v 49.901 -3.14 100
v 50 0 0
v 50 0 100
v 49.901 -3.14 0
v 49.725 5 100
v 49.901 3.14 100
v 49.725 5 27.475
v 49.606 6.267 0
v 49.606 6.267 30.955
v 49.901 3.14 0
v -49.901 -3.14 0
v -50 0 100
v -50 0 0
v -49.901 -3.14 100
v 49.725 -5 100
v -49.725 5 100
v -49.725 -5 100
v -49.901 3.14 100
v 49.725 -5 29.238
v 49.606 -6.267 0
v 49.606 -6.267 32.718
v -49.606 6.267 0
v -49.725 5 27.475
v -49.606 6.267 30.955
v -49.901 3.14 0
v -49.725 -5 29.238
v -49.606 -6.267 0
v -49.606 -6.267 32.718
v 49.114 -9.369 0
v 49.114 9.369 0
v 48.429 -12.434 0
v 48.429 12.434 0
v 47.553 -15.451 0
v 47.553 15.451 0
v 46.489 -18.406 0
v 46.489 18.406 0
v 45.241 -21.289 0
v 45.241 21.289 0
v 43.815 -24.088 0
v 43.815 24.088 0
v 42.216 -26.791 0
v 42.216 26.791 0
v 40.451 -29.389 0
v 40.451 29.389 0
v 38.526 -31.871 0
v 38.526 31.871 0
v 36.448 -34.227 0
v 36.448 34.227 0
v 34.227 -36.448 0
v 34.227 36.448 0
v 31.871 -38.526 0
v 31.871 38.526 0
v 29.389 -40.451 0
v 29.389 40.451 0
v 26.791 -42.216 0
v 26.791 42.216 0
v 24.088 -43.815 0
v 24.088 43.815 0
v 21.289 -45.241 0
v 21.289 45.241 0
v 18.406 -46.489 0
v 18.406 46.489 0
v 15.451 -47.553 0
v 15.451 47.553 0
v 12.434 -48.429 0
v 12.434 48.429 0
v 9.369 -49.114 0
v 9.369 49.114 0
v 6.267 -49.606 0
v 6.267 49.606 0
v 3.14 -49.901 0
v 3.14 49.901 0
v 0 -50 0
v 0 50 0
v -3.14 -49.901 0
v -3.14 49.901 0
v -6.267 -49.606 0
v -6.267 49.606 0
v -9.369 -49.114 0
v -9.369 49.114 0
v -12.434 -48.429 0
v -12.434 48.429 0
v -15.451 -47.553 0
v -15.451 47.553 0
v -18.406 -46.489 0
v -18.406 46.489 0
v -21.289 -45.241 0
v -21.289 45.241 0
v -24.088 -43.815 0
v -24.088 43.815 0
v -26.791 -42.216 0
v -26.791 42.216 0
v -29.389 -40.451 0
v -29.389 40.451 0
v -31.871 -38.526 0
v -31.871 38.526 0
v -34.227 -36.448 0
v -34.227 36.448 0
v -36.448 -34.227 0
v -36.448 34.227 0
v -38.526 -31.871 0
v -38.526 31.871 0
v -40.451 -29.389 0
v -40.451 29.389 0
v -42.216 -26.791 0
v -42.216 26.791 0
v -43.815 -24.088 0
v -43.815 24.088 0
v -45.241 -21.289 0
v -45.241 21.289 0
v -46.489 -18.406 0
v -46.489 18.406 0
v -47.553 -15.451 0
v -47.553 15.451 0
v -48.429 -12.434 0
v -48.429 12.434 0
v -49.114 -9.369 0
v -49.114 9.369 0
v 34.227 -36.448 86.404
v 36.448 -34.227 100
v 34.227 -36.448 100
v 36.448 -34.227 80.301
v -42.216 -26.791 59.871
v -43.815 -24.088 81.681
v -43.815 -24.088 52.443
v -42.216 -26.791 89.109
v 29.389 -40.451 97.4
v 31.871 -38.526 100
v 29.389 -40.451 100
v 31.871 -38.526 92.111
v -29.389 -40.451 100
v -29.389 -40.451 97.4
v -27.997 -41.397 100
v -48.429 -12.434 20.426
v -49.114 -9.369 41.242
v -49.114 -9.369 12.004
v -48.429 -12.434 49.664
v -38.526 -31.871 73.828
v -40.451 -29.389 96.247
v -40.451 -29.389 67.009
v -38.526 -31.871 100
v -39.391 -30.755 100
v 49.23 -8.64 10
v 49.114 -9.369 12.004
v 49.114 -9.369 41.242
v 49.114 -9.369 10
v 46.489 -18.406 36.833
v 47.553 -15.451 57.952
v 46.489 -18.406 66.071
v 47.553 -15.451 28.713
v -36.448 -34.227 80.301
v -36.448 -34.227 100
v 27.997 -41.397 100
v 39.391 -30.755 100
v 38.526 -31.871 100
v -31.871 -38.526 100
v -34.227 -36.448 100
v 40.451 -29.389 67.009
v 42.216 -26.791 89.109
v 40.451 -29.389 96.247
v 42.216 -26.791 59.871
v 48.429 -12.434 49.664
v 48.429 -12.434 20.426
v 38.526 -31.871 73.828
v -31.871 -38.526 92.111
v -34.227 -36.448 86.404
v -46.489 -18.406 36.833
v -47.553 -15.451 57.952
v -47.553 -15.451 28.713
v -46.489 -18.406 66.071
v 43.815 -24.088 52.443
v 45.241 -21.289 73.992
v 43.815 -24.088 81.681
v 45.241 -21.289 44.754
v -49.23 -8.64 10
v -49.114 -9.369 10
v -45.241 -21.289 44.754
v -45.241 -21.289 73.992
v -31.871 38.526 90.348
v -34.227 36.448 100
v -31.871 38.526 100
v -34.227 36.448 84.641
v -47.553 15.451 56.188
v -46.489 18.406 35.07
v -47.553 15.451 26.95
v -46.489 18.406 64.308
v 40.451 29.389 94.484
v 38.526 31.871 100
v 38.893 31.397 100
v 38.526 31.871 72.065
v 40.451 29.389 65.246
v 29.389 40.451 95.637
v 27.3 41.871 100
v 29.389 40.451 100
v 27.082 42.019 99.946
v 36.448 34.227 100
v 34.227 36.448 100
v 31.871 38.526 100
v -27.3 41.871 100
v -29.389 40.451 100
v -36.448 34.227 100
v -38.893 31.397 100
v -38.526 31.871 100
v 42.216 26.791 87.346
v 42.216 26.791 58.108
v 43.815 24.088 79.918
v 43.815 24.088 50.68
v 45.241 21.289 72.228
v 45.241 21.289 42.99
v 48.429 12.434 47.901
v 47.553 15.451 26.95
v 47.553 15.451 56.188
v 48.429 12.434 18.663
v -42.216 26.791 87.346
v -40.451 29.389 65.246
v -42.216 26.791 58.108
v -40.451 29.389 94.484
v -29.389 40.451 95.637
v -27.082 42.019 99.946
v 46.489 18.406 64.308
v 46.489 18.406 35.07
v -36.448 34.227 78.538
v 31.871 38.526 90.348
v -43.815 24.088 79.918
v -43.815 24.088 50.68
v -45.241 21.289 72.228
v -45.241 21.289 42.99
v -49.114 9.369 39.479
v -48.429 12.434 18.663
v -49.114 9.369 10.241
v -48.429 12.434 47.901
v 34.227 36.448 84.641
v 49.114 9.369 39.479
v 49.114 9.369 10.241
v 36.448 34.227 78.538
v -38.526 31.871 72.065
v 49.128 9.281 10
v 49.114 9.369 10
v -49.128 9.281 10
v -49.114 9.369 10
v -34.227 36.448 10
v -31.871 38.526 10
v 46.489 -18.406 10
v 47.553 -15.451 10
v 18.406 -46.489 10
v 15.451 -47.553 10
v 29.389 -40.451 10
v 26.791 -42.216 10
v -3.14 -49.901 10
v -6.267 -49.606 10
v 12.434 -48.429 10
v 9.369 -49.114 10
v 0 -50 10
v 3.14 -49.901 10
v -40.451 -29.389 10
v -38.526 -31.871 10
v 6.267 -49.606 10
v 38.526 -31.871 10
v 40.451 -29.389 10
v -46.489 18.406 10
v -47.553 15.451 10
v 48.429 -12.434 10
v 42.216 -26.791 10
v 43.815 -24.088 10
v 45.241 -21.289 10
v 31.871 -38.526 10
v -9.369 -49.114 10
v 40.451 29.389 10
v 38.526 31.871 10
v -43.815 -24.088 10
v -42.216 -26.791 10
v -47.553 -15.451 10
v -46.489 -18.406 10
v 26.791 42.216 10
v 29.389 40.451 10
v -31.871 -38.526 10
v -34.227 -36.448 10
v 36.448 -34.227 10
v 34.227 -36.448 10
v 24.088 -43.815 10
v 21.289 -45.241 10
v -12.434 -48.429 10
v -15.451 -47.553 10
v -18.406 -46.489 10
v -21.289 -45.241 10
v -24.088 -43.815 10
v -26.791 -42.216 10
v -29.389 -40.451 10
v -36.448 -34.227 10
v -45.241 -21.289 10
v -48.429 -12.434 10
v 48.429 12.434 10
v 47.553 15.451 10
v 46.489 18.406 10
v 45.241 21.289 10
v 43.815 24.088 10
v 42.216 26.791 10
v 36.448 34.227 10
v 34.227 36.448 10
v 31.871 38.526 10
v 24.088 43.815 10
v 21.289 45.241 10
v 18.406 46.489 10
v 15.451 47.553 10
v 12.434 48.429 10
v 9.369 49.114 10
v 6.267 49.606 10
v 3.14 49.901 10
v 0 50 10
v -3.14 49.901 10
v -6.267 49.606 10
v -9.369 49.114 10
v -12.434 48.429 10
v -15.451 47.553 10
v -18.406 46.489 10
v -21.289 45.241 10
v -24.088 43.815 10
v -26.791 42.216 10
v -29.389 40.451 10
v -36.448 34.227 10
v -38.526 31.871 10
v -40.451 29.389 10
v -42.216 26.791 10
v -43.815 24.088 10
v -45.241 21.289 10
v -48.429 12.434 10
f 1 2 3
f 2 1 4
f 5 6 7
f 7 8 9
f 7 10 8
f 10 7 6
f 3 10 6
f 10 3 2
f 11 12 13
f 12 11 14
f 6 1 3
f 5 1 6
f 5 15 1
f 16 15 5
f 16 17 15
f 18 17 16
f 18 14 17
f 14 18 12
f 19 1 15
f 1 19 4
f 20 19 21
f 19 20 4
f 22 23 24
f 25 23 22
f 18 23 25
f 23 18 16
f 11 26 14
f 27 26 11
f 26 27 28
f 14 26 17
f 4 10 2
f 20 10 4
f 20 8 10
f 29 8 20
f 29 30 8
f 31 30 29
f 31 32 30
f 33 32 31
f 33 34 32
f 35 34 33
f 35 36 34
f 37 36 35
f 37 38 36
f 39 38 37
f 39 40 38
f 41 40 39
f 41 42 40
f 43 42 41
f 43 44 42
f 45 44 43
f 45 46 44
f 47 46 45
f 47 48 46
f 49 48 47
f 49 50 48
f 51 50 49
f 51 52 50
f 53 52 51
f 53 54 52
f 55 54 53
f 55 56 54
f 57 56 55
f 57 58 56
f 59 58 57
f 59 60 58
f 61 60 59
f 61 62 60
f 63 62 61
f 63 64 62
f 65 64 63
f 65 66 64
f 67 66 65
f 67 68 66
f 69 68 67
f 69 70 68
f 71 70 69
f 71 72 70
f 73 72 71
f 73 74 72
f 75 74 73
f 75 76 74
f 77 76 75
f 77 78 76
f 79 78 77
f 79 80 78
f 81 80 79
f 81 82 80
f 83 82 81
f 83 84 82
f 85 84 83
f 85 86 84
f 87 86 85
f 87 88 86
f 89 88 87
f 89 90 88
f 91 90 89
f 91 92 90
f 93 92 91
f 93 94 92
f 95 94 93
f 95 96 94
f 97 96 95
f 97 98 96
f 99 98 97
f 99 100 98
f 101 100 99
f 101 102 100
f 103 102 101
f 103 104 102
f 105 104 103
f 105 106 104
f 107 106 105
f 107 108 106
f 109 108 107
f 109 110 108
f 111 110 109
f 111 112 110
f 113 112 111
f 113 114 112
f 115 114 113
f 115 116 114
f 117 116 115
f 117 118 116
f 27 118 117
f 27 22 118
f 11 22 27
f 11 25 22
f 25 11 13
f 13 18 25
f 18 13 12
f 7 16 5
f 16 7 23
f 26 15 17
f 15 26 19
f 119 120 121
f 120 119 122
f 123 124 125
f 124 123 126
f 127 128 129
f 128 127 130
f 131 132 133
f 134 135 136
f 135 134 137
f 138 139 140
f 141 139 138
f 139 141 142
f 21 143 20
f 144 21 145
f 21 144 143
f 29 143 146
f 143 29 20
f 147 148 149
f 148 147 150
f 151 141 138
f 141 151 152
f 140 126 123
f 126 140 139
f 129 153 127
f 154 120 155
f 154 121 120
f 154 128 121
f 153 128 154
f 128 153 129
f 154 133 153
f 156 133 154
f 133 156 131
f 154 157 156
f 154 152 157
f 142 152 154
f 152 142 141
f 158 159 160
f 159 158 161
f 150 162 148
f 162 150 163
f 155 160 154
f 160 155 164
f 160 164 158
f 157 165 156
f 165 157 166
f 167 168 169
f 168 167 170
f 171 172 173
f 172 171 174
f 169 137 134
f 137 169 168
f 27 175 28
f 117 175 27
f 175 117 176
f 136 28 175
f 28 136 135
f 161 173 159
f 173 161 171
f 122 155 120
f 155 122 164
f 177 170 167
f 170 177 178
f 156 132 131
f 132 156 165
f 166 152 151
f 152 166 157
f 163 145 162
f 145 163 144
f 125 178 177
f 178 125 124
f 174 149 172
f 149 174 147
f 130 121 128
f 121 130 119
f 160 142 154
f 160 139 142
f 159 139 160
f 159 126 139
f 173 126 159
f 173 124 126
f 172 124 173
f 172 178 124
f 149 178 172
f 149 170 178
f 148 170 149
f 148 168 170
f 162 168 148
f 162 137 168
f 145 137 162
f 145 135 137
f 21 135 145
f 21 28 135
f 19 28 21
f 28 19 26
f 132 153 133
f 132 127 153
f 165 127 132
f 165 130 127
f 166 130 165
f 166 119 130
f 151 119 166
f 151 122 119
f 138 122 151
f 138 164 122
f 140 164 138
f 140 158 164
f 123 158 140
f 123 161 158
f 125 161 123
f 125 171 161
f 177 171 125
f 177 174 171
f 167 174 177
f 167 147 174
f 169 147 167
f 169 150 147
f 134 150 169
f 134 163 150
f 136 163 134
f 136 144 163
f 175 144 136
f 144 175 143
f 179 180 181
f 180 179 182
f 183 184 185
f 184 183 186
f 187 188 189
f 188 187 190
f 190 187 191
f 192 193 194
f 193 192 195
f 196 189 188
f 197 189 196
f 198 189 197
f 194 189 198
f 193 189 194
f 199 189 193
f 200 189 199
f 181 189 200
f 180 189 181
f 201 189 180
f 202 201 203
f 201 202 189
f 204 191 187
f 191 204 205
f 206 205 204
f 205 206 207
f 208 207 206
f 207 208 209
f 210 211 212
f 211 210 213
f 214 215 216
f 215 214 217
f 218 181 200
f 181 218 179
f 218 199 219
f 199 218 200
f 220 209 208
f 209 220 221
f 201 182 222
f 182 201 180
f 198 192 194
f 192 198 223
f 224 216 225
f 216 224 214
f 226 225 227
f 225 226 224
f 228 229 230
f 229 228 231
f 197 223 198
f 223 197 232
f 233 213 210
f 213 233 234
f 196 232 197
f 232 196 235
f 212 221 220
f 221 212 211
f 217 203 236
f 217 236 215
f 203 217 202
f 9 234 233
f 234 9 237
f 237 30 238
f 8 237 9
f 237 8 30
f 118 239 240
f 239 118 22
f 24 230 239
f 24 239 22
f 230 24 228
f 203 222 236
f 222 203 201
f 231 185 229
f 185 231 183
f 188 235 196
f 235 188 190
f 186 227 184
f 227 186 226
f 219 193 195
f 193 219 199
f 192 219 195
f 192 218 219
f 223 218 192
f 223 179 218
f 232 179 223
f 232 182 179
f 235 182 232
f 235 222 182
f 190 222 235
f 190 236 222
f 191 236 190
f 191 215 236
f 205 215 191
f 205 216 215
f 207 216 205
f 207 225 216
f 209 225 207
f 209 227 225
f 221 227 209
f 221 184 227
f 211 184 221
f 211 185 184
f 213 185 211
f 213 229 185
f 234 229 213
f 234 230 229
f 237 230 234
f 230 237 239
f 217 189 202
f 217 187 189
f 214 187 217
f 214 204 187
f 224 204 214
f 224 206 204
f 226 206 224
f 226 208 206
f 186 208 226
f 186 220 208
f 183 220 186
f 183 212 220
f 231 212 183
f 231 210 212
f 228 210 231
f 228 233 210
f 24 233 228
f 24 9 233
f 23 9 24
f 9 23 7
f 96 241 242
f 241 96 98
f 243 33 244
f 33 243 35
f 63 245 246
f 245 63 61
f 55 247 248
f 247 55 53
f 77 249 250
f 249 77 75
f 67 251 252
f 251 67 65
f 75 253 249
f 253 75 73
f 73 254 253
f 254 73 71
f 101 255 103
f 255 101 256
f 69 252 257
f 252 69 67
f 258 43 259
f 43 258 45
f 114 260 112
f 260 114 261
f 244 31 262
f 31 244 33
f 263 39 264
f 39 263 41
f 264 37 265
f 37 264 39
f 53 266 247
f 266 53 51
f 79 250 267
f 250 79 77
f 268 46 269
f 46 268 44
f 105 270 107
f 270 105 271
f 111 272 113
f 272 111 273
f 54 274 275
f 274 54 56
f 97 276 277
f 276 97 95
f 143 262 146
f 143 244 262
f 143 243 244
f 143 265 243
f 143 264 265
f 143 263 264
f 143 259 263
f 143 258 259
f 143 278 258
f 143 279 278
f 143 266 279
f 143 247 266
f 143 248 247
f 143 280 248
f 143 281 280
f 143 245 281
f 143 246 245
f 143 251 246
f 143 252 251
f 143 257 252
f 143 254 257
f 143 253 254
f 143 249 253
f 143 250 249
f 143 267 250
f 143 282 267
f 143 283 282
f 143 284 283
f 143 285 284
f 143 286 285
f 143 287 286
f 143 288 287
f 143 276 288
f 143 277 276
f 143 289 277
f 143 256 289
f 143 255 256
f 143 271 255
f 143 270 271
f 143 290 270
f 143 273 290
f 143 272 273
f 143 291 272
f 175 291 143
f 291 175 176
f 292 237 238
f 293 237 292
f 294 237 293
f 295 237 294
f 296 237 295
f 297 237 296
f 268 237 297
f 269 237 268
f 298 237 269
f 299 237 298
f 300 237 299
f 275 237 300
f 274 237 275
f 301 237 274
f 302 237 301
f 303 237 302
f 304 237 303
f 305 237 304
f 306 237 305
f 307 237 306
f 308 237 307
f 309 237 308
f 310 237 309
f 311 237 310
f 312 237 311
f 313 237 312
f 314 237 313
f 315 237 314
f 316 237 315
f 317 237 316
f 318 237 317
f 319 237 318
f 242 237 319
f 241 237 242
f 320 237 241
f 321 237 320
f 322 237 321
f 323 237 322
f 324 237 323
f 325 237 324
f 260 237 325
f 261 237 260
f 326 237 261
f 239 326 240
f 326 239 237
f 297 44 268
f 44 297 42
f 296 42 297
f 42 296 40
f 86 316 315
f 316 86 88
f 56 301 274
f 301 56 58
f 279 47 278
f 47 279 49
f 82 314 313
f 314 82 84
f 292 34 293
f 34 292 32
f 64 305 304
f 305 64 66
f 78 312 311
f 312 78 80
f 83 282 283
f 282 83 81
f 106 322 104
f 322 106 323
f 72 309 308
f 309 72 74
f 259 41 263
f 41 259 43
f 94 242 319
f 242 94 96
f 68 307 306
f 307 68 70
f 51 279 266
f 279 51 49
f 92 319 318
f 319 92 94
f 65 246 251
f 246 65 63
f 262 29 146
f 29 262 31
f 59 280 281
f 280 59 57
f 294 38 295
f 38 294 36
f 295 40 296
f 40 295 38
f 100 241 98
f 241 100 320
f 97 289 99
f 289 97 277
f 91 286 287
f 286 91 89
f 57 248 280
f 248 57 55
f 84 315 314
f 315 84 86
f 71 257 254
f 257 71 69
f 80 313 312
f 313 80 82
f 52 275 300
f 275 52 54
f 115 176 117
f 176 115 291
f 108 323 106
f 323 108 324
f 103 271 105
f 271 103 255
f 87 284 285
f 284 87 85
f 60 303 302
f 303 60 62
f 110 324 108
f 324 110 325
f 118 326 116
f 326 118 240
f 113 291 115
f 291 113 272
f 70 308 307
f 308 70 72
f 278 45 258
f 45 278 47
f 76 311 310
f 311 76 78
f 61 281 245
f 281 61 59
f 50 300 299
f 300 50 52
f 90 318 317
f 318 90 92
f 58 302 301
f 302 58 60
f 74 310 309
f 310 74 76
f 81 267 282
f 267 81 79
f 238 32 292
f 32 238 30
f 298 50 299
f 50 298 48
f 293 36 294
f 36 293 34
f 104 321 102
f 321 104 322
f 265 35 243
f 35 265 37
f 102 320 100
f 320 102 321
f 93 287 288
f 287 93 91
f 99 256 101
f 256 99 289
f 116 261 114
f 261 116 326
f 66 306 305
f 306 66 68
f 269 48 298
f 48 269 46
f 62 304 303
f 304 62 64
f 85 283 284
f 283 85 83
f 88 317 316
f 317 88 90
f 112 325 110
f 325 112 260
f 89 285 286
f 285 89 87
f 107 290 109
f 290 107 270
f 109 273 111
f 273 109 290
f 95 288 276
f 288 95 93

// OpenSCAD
$fn=100;
h=100;
r=50;
t=10;
a=20;


intersection() {
    cylinder(h, r, r);
    translate([-r, -5, 0]) {
        cube([100, t, h]);
    }
}

intersection() {
    cylinder(h, r, r);
    
    translate([-r, -t/2, 0]) {
        rotate([a, 0, 0]) {
            cube([2*r, t, h*1.1]);
        }
    }
}

intersection() {
    cylinder(h, r, r);
    
    translate([-r, -t/2, 0]) {
        rotate([-a, 0, 0]) {
            cube([2*r, t, h*1.1]);
        }
    }
}

cylinder(t, r, r);
